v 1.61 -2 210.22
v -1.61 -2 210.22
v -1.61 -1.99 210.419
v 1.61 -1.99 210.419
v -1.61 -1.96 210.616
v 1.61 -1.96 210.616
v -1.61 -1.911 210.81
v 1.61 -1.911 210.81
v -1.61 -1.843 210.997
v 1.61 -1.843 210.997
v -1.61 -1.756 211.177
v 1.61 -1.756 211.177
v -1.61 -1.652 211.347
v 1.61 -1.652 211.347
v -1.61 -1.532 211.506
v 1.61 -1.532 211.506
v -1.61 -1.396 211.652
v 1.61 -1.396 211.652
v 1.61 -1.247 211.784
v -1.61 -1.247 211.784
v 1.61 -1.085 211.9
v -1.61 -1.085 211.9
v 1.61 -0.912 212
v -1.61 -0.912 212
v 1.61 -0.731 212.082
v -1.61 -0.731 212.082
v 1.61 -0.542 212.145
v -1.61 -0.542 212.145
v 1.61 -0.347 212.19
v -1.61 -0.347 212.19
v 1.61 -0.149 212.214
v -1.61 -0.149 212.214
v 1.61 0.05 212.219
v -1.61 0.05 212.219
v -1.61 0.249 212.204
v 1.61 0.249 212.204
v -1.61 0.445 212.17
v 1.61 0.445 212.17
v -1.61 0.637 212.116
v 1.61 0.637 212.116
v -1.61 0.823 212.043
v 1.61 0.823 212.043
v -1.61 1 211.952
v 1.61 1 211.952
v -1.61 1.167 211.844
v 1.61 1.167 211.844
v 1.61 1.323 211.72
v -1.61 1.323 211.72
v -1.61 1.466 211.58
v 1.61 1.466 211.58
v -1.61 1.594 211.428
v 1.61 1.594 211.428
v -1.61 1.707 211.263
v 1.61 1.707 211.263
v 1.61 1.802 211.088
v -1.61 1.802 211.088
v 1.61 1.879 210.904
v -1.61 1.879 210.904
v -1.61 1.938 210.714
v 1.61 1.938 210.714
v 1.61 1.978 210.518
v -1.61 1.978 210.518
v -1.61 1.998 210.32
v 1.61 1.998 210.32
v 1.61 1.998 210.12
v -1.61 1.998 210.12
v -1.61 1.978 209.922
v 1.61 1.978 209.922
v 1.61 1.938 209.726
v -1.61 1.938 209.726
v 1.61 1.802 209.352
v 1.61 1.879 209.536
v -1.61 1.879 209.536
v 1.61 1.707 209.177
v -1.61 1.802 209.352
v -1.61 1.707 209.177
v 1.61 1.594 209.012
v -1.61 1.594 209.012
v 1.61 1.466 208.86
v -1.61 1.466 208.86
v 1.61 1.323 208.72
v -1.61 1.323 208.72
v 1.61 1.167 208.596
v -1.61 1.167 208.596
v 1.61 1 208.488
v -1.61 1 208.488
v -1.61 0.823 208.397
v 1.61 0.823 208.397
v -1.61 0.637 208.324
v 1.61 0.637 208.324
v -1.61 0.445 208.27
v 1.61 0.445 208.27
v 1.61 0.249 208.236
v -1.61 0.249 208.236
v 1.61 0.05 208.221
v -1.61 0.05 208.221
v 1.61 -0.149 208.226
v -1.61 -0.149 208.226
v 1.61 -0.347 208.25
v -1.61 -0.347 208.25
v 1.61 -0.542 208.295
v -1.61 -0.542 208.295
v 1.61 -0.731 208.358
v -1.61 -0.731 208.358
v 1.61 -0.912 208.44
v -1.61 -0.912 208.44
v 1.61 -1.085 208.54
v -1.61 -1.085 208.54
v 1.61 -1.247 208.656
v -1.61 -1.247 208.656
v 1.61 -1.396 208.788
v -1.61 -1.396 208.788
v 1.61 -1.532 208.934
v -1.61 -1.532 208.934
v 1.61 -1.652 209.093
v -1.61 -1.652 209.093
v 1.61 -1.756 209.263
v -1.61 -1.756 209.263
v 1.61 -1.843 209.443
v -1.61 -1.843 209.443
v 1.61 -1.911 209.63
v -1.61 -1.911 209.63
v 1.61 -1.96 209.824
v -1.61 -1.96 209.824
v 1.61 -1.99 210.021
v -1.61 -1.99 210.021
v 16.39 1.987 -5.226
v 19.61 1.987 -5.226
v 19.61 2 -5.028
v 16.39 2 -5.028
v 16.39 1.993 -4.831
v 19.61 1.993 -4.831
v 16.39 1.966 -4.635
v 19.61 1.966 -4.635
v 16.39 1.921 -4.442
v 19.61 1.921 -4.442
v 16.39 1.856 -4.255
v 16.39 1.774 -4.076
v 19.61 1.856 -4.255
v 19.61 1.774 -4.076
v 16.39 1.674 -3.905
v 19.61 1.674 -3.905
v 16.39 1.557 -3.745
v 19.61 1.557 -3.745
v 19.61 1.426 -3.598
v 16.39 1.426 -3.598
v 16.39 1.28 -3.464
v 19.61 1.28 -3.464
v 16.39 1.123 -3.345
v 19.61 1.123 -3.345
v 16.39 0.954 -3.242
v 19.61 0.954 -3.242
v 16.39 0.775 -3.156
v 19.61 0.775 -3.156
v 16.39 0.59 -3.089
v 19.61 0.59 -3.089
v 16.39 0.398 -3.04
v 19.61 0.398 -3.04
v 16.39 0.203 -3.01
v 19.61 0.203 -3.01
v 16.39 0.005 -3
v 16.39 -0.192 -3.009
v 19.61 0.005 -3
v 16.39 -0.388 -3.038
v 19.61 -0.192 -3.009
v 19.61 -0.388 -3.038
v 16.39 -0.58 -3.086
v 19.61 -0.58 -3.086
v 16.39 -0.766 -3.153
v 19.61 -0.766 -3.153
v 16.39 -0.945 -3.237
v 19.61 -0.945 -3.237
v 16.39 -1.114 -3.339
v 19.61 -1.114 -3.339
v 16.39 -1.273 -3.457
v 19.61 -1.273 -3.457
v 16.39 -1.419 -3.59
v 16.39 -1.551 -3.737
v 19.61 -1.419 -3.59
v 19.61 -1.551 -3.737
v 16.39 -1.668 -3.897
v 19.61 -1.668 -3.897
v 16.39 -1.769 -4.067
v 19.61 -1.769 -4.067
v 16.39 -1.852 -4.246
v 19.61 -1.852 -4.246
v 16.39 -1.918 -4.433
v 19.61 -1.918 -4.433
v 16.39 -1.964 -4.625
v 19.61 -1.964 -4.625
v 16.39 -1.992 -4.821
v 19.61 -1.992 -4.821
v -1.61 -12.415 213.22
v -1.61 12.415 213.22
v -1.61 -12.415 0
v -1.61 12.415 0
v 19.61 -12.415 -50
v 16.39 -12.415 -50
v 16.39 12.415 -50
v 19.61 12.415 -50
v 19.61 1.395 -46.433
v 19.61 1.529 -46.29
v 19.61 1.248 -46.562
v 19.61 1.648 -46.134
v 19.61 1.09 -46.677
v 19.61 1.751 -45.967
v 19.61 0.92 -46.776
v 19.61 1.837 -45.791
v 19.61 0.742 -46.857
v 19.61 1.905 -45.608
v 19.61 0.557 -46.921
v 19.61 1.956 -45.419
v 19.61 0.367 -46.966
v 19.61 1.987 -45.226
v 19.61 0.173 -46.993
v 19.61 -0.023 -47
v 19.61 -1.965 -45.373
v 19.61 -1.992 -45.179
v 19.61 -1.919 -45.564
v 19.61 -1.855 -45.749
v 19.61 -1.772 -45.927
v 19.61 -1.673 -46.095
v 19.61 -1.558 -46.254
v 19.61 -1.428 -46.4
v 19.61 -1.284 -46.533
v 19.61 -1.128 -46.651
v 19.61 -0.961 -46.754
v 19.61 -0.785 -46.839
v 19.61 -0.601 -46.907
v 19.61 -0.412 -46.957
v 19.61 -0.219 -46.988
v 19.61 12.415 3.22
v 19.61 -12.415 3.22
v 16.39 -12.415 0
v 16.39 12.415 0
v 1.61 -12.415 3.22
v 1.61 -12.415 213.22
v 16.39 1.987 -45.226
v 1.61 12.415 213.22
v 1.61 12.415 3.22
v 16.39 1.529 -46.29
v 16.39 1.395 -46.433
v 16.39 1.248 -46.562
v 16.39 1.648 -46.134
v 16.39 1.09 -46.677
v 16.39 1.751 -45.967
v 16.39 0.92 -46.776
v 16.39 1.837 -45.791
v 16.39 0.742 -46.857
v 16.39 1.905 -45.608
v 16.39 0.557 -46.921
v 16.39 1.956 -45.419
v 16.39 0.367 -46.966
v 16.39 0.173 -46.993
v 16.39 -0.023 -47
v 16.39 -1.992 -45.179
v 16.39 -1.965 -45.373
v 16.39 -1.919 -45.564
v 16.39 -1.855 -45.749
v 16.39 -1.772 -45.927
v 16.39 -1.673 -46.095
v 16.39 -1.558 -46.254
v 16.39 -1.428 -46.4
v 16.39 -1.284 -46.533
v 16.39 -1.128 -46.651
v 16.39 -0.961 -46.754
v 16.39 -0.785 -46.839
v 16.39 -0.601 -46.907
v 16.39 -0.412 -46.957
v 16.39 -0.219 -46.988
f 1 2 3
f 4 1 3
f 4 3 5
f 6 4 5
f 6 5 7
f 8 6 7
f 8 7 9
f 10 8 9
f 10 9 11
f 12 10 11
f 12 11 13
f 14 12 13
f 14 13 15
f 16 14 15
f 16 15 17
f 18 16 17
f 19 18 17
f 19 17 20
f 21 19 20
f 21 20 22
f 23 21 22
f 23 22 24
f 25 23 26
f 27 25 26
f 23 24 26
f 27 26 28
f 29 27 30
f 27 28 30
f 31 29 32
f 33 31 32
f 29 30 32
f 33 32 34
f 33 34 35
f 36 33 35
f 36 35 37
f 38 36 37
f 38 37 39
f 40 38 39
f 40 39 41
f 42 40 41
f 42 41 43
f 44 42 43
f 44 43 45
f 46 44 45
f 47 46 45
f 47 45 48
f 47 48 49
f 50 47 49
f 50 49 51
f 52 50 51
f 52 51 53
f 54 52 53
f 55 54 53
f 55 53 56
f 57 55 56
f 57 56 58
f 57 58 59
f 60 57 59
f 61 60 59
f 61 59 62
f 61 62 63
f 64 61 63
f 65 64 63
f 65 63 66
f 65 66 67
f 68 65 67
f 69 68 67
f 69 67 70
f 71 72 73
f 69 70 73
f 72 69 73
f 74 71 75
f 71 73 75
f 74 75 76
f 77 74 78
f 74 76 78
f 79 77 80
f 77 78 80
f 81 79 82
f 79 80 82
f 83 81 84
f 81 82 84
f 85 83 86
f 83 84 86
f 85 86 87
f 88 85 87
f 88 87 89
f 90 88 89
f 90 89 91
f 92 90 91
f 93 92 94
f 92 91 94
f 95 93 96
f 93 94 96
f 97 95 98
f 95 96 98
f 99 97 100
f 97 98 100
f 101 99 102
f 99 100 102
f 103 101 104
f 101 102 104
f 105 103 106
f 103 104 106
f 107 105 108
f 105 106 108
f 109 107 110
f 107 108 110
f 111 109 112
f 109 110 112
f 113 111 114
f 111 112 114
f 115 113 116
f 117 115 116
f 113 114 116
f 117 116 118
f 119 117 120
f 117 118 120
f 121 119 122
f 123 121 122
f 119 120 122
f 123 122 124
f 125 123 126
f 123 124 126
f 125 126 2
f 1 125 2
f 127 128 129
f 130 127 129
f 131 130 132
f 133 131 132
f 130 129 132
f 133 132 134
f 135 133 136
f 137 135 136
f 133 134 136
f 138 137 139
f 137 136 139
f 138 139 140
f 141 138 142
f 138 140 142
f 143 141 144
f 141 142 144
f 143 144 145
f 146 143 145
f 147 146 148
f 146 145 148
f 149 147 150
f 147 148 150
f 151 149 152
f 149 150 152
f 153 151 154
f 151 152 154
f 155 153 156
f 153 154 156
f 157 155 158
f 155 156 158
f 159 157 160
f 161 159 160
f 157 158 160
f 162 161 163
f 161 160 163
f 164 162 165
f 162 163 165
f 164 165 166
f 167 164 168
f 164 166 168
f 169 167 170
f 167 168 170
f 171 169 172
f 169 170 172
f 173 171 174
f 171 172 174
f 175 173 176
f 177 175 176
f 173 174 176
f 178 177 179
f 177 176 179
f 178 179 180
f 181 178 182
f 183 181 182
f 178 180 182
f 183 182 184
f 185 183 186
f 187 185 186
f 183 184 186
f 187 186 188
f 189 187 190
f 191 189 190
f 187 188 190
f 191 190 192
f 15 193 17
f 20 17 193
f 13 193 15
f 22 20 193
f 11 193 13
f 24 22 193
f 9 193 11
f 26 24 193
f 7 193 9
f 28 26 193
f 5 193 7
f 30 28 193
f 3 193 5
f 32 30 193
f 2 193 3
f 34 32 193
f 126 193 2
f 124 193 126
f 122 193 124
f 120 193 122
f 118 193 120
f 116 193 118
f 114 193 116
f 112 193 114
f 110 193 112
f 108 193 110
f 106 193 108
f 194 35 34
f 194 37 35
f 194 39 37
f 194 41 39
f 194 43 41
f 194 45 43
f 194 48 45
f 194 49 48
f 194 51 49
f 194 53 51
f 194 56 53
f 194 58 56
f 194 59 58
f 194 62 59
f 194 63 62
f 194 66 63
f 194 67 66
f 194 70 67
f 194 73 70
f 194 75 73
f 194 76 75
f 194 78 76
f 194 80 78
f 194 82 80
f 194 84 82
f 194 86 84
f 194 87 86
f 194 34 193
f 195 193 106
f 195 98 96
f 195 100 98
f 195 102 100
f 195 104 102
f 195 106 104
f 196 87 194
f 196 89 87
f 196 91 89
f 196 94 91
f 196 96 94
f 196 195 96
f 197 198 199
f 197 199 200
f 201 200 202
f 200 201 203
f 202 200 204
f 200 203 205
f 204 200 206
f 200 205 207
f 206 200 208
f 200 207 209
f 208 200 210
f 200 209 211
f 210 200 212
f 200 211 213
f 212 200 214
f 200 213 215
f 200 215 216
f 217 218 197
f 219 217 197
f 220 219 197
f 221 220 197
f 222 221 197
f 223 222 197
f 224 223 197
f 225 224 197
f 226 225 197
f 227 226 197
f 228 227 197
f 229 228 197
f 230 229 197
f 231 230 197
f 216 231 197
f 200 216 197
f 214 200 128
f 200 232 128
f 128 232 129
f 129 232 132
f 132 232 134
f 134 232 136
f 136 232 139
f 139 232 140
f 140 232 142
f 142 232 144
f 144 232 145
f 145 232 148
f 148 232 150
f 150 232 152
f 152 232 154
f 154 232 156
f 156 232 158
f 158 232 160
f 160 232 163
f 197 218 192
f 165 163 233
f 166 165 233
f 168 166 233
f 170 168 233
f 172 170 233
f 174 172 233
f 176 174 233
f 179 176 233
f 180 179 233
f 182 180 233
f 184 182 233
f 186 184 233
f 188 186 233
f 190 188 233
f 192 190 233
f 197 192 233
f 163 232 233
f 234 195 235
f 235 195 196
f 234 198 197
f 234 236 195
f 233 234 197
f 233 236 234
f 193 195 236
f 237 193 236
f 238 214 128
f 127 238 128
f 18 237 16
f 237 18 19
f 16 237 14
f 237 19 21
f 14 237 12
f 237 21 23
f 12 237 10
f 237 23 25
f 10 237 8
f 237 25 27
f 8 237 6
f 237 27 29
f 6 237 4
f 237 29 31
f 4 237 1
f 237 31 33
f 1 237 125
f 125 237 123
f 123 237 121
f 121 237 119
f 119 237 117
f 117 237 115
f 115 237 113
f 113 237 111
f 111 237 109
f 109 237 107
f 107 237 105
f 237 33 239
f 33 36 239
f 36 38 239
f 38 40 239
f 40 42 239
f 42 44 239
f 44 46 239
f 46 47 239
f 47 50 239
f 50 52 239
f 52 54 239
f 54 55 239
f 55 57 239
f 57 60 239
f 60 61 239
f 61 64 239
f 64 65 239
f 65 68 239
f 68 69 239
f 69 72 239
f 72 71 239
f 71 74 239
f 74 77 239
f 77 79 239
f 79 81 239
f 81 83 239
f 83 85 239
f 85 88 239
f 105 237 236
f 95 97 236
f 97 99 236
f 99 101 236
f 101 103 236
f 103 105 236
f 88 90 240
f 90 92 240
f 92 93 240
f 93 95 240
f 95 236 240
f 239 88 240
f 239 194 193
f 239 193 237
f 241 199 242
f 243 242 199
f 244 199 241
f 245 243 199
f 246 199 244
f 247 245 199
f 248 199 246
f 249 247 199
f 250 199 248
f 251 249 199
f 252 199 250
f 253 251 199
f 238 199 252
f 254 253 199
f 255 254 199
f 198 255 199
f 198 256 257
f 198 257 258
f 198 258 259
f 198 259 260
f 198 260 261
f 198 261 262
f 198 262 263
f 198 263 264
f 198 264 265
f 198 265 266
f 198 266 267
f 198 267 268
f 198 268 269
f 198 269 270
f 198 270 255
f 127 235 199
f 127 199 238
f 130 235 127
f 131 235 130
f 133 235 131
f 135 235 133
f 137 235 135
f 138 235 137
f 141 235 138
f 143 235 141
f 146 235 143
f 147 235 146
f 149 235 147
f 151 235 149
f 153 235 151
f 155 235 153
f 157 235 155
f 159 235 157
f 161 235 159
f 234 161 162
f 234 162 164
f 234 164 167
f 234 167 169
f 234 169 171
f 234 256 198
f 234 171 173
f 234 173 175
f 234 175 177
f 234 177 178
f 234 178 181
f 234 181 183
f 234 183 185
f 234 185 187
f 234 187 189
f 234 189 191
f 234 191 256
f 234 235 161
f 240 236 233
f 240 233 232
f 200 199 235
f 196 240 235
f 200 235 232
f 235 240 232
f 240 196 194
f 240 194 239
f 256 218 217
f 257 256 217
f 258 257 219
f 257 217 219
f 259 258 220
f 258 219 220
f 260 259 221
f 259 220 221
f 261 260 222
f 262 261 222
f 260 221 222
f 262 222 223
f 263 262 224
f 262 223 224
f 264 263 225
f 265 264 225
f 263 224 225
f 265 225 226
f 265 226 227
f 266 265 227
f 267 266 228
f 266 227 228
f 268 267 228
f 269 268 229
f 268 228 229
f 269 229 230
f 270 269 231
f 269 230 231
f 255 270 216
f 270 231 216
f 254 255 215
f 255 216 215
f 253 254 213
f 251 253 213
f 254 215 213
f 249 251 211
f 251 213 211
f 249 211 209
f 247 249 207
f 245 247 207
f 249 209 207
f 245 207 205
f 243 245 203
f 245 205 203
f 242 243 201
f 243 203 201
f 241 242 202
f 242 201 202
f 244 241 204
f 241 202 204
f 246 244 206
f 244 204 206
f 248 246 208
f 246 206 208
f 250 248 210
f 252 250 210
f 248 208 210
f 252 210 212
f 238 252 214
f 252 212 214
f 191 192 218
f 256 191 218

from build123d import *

# Parameters (mm, degrees)
F0_W      = 3.22
F0_H      = 24.83
F1_DEPTH  = 3.22
F1_FACE_W = 3.22
F1_FACE_H = 24.83
F2_DEPTH  = 210
F4_D      = 4
F4_DEPTH  = 3.22
F5_W      = 24.83
F5_H      = 3.22
F6_DEPTH  = 18
F7_W      = 3.22
F7_H      = 24.83
F8_DEPTH  = 50
F10_DEPTH = 3.22


with BuildPart() as f1:
    # F0 (on Top) → F1 (new body)
    with BuildSketch(Plane.XY):
        Rectangle(F0_W, F0_H)
    extrude(amount=F1_DEPTH)

    # F1_face (on face) → F2 (join)
    with BuildSketch(Plane.XY.offset(3.22)):
        Rectangle(F1_FACE_W, F1_FACE_H)
    extrude(amount=F2_DEPTH)

    # F4
    with Locations(Plane.YZ.offset(1.61)):
        with Locations((0, 210.22)):
            Hole(F4_D / 2, depth=F4_DEPTH)

    # F5 (on face) → F6 (join)
    with BuildSketch(Plane.YZ.offset(1.61)):
        with Locations((0, 1.61)):
            Rectangle(F5_W, F5_H)
    extrude(amount=F6_DEPTH)

    # F7 (on face) → F8 (join)
    with BuildSketch(Plane(origin=(0, 0, 0), x_dir=(1, 0, 0), z_dir=(0, 0, -1))):
        with Locations((18, 0)):
            Rectangle(F7_W, F7_H)
    extrude(amount=F8_DEPTH)

    # F9 (on face) → F10 (cut)
    with BuildSketch(Plane.YZ.offset(19.61)):
        with BuildLine():
            Line((1.987245, -44.774488), (1.987245, -5.225512))
            ThreePointArc((1.987245, -5.225512), (0.202519, -3.01028), (-1.991929, -4.820501))
            Line((-1.991929, -4.820501), (-1.991929, -5.179499))
            Line((-1.991929, -5.179499), (-1.991929, -44.820501))
            Line((-1.991929, -44.820501), (-1.991929, -45.179499))
            ThreePointArc((-1.991929, -45.179499), (-0.023125, -46.999866), (1.987245, -45.225512))
            Line((1.987245, -45.225512), (1.987245, -44.774488))
        make_face()
    extrude(amount=-F10_DEPTH, mode=Mode.SUBTRACT)


solid = f1.part
